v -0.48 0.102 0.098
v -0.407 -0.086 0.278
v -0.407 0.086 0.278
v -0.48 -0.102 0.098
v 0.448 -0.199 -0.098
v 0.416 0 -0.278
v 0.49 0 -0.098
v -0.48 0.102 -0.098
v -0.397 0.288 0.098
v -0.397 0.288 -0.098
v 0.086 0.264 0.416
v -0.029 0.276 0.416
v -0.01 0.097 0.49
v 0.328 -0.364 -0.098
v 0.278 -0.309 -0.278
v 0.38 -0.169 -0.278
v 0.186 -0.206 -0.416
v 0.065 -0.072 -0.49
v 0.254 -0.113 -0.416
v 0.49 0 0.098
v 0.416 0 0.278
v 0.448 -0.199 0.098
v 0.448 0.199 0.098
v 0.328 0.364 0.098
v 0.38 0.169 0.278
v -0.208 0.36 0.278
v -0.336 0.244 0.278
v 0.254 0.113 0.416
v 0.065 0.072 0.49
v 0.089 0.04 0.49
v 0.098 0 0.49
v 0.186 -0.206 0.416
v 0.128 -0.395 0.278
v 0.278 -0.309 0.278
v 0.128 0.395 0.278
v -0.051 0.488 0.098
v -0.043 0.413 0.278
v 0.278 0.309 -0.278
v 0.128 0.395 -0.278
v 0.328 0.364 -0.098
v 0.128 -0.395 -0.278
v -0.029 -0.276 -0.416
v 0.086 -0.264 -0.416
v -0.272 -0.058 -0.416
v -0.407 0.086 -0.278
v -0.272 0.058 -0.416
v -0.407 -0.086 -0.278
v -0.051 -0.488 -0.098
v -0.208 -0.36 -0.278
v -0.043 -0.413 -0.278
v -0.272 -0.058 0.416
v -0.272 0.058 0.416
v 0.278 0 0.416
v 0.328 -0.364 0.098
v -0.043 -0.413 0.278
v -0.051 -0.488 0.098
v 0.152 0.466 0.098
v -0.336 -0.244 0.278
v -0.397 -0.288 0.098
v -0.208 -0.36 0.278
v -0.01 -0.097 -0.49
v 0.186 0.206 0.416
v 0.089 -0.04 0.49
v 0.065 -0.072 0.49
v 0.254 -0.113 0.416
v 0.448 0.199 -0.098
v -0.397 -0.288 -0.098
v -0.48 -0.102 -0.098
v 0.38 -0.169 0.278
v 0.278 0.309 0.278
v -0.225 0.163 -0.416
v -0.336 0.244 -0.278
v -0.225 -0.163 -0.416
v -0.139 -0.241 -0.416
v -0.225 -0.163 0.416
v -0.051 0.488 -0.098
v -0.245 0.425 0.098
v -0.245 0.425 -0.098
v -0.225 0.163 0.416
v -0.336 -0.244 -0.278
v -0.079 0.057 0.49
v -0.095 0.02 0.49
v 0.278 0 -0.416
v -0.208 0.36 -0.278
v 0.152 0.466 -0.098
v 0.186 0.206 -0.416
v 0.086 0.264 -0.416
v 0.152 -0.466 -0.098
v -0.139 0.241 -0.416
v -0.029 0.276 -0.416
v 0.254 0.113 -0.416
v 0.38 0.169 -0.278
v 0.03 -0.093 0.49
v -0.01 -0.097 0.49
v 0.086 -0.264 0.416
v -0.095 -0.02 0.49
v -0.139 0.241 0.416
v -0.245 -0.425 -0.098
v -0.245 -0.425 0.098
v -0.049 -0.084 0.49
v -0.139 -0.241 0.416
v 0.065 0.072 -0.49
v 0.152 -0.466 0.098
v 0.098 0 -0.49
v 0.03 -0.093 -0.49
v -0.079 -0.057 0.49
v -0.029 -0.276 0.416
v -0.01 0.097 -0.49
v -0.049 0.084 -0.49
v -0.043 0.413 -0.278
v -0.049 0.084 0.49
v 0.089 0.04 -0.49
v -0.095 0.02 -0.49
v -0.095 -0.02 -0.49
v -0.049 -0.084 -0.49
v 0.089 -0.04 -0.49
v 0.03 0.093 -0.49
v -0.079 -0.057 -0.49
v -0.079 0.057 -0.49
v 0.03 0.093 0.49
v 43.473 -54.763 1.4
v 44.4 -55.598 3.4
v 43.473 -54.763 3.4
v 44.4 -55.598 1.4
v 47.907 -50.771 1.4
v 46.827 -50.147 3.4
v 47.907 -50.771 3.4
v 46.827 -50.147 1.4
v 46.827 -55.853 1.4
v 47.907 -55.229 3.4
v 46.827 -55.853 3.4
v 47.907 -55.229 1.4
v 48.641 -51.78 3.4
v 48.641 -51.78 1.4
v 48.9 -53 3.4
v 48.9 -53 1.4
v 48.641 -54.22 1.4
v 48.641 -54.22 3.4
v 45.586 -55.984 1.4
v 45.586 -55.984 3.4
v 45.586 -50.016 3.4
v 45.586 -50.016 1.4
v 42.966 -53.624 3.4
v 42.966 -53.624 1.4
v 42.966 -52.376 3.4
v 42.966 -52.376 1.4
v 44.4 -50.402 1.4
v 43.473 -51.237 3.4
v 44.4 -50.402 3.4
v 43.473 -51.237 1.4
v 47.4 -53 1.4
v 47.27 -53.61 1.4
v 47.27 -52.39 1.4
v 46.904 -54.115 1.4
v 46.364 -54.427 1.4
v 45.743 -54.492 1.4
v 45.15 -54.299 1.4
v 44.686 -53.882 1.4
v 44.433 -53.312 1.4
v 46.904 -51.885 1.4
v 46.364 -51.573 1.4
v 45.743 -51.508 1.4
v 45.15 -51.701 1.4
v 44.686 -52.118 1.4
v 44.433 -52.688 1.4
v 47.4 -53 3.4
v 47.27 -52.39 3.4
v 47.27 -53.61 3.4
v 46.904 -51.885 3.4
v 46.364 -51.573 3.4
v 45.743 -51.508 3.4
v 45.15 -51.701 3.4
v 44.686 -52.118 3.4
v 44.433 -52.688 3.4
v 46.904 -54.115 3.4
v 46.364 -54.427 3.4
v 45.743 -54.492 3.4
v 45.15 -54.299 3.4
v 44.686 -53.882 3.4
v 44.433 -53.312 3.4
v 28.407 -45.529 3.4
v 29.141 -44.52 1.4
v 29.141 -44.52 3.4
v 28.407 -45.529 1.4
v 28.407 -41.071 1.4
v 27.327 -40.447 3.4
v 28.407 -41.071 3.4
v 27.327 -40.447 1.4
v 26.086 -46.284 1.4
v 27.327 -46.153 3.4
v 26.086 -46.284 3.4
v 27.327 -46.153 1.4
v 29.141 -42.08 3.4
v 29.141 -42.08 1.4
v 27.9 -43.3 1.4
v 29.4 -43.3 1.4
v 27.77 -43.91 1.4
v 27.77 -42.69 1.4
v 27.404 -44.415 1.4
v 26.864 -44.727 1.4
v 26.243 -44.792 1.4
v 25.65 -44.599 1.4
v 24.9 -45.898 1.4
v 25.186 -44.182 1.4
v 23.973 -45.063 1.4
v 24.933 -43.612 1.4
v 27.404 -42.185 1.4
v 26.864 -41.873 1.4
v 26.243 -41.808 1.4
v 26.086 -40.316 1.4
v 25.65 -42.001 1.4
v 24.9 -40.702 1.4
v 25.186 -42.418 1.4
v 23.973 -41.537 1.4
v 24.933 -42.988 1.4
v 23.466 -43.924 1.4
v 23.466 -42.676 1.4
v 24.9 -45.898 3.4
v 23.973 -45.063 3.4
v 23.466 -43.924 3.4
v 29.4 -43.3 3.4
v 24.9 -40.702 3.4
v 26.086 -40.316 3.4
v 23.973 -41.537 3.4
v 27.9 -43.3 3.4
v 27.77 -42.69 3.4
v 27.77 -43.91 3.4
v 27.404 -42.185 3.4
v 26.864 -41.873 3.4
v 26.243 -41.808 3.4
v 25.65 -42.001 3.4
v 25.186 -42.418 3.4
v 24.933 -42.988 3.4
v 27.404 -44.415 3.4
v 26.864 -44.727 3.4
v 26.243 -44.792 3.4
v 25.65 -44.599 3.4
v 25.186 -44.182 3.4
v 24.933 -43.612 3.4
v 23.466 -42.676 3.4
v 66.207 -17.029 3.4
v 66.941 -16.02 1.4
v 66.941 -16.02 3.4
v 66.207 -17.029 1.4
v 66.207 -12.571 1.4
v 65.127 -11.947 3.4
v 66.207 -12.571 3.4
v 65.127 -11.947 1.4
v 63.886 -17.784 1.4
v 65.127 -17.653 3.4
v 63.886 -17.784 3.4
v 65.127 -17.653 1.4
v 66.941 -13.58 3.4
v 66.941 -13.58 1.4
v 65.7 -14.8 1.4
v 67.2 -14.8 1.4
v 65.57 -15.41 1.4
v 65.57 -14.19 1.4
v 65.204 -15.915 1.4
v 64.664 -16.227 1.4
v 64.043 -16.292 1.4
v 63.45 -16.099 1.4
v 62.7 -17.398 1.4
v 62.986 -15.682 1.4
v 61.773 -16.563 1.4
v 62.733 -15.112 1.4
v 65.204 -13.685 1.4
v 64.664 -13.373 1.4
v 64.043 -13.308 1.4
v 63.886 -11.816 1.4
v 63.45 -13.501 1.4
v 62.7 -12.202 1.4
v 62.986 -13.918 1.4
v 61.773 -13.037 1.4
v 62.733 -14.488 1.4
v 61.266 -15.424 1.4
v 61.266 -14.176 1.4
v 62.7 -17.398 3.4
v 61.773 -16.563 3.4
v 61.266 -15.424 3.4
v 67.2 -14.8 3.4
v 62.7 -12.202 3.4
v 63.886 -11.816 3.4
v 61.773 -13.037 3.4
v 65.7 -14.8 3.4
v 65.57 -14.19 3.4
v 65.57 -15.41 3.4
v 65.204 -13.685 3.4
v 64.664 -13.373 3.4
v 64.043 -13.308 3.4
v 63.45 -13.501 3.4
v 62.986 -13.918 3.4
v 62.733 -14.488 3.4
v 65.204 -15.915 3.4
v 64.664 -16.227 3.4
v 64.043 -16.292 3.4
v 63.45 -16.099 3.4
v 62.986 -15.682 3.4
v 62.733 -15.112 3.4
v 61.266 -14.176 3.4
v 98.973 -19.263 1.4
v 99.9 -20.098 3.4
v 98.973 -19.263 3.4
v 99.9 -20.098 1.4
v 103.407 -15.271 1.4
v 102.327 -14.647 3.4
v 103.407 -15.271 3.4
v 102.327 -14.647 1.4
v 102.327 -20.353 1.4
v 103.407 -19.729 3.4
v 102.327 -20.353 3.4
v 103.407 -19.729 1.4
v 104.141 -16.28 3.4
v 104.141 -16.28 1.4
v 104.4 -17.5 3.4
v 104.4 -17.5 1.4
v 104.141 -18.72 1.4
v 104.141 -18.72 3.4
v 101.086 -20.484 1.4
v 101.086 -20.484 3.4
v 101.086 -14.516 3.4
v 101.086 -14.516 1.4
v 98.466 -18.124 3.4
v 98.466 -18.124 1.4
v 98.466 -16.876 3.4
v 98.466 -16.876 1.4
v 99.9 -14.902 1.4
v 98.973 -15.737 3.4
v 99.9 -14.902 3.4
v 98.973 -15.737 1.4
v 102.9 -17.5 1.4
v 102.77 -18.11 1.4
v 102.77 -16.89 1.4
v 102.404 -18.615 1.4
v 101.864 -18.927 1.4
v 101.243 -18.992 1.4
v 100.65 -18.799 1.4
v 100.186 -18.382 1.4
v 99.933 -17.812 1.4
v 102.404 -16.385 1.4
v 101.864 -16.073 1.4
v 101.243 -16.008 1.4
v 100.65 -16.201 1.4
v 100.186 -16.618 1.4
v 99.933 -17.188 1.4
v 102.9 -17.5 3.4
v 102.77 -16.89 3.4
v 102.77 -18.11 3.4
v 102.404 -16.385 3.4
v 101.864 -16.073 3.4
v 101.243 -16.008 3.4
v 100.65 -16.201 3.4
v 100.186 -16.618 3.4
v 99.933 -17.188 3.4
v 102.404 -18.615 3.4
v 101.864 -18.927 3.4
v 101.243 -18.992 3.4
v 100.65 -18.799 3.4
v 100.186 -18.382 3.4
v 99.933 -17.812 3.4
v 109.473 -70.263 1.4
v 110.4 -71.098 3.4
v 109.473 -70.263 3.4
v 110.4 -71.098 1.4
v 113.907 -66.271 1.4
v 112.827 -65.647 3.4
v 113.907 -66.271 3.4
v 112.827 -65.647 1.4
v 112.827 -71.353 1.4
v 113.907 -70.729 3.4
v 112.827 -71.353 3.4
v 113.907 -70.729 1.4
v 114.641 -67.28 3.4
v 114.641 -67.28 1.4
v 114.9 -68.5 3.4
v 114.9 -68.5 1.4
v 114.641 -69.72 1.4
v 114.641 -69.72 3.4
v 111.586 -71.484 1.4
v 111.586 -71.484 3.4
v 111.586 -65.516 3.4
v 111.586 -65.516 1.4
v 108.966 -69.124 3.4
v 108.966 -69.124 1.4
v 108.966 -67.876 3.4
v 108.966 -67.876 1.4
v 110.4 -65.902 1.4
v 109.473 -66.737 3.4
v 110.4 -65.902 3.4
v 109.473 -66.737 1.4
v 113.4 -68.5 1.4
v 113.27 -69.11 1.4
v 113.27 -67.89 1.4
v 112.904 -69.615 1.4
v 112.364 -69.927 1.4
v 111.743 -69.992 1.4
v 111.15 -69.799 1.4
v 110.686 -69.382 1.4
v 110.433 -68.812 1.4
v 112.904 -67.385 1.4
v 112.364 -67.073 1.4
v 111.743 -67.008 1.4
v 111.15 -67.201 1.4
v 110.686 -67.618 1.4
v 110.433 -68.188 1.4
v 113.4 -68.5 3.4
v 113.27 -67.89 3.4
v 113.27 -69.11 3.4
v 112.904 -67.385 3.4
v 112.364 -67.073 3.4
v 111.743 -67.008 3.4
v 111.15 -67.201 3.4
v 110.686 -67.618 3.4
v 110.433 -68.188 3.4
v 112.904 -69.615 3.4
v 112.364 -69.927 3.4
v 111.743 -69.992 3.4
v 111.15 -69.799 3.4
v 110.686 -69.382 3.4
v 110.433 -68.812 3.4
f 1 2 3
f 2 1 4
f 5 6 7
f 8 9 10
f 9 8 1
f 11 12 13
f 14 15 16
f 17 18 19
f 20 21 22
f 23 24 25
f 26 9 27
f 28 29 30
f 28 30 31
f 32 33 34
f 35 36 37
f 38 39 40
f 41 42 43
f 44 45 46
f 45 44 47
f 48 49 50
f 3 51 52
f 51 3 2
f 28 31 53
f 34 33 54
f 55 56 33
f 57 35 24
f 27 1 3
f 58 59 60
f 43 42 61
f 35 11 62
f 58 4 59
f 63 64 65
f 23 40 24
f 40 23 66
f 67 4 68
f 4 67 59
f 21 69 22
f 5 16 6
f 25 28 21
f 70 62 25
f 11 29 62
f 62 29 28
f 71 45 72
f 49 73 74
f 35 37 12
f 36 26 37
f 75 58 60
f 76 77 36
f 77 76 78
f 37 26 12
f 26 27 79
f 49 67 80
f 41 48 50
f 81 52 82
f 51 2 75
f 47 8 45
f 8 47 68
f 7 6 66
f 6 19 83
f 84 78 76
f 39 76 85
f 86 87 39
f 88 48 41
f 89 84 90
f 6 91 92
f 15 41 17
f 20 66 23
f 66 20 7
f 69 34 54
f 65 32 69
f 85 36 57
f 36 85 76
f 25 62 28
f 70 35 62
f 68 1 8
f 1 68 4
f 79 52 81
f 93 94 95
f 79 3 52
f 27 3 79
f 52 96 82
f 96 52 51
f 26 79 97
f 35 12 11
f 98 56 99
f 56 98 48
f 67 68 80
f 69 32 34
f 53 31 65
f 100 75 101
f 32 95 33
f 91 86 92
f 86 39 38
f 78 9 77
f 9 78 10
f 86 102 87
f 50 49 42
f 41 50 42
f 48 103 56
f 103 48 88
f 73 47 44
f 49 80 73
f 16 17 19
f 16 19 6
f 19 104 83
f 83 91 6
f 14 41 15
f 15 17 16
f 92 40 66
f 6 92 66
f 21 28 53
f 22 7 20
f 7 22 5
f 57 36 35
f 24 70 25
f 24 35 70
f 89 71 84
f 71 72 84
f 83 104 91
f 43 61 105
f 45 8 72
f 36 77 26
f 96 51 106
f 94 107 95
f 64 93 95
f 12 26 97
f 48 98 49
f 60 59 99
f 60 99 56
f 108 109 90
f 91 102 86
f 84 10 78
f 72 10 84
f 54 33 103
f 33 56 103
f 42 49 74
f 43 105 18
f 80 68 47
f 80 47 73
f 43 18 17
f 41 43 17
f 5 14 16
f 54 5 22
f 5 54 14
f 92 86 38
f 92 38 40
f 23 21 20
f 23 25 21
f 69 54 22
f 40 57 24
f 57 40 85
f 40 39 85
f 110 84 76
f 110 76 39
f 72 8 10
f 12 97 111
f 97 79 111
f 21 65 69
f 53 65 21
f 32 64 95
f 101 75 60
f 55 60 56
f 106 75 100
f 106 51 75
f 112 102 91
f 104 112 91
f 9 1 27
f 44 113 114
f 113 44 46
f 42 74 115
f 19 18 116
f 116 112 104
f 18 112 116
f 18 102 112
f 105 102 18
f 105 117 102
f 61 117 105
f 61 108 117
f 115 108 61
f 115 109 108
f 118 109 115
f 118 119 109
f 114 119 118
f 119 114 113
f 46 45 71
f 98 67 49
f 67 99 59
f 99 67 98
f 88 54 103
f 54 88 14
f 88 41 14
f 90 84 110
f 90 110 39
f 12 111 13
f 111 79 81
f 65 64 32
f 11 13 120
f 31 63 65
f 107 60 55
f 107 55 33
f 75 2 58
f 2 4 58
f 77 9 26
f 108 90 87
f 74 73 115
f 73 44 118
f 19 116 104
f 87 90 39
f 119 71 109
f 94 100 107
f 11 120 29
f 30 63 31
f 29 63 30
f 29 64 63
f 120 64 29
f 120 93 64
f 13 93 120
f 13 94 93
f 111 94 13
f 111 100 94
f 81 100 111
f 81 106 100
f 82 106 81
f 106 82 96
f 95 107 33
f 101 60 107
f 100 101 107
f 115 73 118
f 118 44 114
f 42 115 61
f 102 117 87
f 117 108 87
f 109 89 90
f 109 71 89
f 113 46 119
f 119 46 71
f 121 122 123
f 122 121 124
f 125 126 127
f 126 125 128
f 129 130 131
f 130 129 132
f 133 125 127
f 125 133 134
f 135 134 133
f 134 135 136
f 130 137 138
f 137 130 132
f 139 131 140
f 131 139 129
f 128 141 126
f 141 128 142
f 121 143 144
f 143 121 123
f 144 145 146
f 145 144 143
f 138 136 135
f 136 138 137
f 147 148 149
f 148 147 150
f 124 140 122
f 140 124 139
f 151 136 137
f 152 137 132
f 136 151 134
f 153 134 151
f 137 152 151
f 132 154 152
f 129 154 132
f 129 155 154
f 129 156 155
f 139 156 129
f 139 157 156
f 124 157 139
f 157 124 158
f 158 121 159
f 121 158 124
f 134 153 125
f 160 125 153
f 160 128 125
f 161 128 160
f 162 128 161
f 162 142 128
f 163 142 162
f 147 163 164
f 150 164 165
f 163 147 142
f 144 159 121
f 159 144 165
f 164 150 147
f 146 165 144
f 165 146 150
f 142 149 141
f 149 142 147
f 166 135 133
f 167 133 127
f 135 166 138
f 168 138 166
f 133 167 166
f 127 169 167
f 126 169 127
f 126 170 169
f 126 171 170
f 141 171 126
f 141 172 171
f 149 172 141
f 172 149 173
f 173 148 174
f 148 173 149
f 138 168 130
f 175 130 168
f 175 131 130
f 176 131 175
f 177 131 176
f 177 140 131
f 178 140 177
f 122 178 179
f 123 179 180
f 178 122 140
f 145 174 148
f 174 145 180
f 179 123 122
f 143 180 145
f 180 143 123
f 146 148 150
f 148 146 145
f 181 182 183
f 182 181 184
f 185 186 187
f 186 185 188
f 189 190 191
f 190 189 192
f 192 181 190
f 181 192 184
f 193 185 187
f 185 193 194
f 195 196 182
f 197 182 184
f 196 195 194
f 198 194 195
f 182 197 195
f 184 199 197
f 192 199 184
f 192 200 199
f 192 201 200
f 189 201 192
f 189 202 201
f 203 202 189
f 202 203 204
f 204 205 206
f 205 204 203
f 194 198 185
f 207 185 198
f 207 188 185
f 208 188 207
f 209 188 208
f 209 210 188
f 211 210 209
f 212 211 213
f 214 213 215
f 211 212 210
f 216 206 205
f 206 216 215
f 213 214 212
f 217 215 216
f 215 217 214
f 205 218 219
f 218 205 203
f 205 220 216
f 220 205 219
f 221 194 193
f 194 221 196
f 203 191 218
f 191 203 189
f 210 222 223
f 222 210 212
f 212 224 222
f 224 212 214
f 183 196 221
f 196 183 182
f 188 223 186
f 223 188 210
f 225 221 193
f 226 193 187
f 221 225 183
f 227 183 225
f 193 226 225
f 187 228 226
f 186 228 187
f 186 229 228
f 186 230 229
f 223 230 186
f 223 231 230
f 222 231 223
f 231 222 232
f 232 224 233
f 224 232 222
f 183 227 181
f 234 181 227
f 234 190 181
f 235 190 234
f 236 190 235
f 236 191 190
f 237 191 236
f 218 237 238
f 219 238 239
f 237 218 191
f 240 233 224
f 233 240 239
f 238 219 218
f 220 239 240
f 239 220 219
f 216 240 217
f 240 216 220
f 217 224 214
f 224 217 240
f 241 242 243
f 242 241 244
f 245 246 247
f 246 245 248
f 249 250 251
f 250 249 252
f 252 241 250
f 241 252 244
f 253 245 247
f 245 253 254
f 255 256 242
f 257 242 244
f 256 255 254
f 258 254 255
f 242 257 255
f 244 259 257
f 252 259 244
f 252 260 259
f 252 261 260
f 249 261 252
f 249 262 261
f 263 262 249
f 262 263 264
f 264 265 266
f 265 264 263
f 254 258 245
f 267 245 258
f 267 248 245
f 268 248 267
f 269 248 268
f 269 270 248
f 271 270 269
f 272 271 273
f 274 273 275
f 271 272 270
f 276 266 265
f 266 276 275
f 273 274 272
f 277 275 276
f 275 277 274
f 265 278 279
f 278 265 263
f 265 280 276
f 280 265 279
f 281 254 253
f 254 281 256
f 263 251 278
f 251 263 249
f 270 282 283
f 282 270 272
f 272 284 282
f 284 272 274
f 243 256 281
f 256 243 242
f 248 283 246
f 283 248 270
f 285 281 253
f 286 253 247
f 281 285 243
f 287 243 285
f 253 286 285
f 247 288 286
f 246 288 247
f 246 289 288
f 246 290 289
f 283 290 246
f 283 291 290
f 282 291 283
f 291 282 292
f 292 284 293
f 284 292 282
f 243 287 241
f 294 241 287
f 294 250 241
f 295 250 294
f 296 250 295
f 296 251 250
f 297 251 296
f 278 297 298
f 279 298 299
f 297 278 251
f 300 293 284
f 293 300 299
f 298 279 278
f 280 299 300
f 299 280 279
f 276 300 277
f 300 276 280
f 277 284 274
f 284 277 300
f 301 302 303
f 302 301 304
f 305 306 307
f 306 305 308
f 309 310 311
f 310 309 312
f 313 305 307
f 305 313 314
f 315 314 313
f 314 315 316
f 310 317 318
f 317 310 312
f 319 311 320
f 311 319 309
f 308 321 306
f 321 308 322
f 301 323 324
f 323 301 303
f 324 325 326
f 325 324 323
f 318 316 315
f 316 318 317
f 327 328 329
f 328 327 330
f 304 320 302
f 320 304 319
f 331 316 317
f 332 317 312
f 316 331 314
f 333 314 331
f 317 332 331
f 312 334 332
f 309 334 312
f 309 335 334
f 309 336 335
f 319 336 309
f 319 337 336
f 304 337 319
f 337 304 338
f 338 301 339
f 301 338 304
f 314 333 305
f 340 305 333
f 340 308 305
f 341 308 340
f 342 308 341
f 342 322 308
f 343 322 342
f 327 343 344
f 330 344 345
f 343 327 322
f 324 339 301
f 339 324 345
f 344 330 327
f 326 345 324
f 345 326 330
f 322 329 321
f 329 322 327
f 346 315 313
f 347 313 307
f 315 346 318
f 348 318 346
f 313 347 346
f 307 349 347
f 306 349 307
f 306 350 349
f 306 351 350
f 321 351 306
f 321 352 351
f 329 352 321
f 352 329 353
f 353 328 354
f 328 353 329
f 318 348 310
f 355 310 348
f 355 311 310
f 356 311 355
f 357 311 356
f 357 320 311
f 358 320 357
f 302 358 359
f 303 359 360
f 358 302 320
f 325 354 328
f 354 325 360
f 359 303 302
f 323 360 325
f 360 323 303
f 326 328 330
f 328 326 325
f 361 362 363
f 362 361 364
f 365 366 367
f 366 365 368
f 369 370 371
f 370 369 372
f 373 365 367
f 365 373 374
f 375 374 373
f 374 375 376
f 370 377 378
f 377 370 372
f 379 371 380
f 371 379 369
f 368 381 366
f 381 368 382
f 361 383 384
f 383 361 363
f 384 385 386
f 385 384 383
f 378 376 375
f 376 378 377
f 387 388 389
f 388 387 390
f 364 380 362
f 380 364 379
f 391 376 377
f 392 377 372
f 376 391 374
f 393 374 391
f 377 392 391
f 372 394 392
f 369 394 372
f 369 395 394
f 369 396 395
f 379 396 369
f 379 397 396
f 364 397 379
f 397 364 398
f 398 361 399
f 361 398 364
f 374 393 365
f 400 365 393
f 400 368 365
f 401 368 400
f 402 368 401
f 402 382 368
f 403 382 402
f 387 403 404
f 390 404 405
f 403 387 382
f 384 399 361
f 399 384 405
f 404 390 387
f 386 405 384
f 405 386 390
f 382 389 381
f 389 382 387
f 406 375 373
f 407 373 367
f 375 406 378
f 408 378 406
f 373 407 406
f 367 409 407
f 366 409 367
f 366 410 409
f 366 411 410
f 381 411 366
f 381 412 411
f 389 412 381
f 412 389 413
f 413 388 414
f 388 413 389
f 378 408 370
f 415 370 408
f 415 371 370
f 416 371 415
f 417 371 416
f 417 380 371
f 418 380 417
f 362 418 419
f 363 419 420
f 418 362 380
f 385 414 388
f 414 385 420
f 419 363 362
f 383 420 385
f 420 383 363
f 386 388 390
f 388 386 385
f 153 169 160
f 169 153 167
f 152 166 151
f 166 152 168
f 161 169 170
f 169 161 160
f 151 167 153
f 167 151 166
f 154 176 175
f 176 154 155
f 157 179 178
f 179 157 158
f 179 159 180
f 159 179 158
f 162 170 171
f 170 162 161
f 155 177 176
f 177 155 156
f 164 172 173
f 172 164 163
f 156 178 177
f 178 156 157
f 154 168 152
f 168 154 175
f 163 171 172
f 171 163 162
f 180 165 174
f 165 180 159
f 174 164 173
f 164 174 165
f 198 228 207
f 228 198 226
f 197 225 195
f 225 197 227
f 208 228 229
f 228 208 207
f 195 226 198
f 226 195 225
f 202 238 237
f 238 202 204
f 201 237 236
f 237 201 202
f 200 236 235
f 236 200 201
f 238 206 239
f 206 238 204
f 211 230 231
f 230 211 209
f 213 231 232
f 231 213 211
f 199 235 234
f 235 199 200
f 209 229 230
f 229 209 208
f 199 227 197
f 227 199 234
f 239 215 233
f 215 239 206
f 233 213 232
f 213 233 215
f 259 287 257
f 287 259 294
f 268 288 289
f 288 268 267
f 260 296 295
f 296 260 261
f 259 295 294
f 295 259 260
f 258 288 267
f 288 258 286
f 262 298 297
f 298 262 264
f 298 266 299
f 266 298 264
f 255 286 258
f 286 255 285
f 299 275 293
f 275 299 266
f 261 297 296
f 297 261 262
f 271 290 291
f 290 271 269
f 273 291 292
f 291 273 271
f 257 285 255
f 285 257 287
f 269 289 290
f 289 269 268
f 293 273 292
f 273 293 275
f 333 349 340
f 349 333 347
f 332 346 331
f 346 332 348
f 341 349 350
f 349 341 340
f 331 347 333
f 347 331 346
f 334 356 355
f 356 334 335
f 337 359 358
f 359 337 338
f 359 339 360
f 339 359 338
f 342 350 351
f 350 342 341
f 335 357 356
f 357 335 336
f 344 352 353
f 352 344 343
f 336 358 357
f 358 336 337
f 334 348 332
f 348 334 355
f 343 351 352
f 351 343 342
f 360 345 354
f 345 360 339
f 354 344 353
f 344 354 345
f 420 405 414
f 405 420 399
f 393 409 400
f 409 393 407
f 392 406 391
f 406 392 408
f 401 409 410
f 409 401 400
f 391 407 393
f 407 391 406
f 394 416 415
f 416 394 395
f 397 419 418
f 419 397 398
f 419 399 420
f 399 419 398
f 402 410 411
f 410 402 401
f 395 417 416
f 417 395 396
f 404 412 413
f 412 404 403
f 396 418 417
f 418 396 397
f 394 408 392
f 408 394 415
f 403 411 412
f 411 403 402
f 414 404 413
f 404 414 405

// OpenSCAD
hole_locations = [
    [45.9, -53],
    [26.4, -43.3],
    [64.2, -14.8],
    [101.4, -17.5],
    [111.9, -68.5],
];

pcb_thickness = 1.6;
component_thickness = 2;
case_thickness = 1.5;

plate_thickness = 1.2;
pcb_plate_gap = 1;

total_plate_thickness = plate_thickness + pcb_plate_gap;

total_thickness = pcb_thickness +
    component_thickness + case_thickness +
    total_plate_thickness;

pcb_case_margin = 0.5;
pcb_ridge_margin = 1;

case_wall_thickness = 4;

heat_insert_radius = 1.5;
strut_radius = 3;

// rendering level
$fn = 15;

right_side = false;

module pcb() {
    translate([-75, 50, 0])
    scale([25.4, 25.4, 1])
    import("empty-pcb.dxf");
}

module pcb_ghost() {
    %
    translate([0, 0, case_thickness + component_thickness])
    linear_extrude(pcb_thickness)
    pcb();
}

module pcb_cutout() {
    translate([0, 0, case_thickness + component_thickness])
    linear_extrude(pcb_thickness + total_plate_thickness + 1)
    offset(pcb_case_margin)
    pcb();
}

module component_cutout() {
    translate([0, 0, case_thickness])
    linear_extrude(component_thickness + pcb_thickness + 0.1)
    offset(-pcb_ridge_margin)
    pcb();
}

module case_body() {
    minkowski() {
        linear_extrude(total_thickness)
        offset(case_wall_thickness)
        pcb();
        sphere(0.5);
    }
}

module heat_insert_holes() {
    for (location = hole_locations) {
        translate([location[0], location[1], case_thickness + component_thickness - 3])
        linear_extrude(10)
        circle(heat_insert_radius);
    }
}

module heat_insert_struts() {
    for (location = hole_locations) {
        translate([location[0], location[1], case_thickness - 0.1])
        linear_extrude(component_thickness)
        circle(strut_radius);
    }
}

module wire_port_cutout() {
    translate([24.135, -28, case_thickness + component_thickness + total_thickness / 2+ pcb_thickness])
    rotate([0, 0, 8])
    cube([38.75, 35, total_thickness], center=true);
}

module power_switch_cutout() {
    z_rotation_base = 8;
    z_rotation_delta = 15;

    intersection() {
        translate([27.7, -18.5, 1])
        rotate([0, 0, z_rotation_base + z_rotation_delta])
        cube([12, 10, 6]);

        translate([23.7, -16, 1])
        rotate([0, 0, z_rotation_base - z_rotation_delta])
        cube([12, 10, 6]);

        translate([24.7, -17, 2])
        rotate([-10, 0, z_rotation_base])
        cube([15, 10, 6]);
    }
}

module reset_switch_cutout() {
    intersection() {
        translate([6.4, -42.3, 3])
        rotate([-15, 0, 8])
        cube([10, 15, 6]);
        
        translate([6.4, -41.03, 0])
        rotate([0, 0, 8])
        cube([10, 15, 9]);

        translate([6.4, -46, 1])
        rotate([0, 0, 28])
        cube([10, 21, 6]);
    }
}

module full_case() {
    difference() {
        union() {
            difference() {
                case_body();
                pcb_cutout();
                component_cutout();
                wire_port_cutout();
                power_switch_cutout();
                reset_switch_cutout();
            };
            heat_insert_struts();
        };
        heat_insert_holes();
        pcb_ghost();
    };
}

if (right_side) {
    translate([110, 0, 0])
    mirror([1, 0, 0])
    full_case();
} else {
    full_case();
};
